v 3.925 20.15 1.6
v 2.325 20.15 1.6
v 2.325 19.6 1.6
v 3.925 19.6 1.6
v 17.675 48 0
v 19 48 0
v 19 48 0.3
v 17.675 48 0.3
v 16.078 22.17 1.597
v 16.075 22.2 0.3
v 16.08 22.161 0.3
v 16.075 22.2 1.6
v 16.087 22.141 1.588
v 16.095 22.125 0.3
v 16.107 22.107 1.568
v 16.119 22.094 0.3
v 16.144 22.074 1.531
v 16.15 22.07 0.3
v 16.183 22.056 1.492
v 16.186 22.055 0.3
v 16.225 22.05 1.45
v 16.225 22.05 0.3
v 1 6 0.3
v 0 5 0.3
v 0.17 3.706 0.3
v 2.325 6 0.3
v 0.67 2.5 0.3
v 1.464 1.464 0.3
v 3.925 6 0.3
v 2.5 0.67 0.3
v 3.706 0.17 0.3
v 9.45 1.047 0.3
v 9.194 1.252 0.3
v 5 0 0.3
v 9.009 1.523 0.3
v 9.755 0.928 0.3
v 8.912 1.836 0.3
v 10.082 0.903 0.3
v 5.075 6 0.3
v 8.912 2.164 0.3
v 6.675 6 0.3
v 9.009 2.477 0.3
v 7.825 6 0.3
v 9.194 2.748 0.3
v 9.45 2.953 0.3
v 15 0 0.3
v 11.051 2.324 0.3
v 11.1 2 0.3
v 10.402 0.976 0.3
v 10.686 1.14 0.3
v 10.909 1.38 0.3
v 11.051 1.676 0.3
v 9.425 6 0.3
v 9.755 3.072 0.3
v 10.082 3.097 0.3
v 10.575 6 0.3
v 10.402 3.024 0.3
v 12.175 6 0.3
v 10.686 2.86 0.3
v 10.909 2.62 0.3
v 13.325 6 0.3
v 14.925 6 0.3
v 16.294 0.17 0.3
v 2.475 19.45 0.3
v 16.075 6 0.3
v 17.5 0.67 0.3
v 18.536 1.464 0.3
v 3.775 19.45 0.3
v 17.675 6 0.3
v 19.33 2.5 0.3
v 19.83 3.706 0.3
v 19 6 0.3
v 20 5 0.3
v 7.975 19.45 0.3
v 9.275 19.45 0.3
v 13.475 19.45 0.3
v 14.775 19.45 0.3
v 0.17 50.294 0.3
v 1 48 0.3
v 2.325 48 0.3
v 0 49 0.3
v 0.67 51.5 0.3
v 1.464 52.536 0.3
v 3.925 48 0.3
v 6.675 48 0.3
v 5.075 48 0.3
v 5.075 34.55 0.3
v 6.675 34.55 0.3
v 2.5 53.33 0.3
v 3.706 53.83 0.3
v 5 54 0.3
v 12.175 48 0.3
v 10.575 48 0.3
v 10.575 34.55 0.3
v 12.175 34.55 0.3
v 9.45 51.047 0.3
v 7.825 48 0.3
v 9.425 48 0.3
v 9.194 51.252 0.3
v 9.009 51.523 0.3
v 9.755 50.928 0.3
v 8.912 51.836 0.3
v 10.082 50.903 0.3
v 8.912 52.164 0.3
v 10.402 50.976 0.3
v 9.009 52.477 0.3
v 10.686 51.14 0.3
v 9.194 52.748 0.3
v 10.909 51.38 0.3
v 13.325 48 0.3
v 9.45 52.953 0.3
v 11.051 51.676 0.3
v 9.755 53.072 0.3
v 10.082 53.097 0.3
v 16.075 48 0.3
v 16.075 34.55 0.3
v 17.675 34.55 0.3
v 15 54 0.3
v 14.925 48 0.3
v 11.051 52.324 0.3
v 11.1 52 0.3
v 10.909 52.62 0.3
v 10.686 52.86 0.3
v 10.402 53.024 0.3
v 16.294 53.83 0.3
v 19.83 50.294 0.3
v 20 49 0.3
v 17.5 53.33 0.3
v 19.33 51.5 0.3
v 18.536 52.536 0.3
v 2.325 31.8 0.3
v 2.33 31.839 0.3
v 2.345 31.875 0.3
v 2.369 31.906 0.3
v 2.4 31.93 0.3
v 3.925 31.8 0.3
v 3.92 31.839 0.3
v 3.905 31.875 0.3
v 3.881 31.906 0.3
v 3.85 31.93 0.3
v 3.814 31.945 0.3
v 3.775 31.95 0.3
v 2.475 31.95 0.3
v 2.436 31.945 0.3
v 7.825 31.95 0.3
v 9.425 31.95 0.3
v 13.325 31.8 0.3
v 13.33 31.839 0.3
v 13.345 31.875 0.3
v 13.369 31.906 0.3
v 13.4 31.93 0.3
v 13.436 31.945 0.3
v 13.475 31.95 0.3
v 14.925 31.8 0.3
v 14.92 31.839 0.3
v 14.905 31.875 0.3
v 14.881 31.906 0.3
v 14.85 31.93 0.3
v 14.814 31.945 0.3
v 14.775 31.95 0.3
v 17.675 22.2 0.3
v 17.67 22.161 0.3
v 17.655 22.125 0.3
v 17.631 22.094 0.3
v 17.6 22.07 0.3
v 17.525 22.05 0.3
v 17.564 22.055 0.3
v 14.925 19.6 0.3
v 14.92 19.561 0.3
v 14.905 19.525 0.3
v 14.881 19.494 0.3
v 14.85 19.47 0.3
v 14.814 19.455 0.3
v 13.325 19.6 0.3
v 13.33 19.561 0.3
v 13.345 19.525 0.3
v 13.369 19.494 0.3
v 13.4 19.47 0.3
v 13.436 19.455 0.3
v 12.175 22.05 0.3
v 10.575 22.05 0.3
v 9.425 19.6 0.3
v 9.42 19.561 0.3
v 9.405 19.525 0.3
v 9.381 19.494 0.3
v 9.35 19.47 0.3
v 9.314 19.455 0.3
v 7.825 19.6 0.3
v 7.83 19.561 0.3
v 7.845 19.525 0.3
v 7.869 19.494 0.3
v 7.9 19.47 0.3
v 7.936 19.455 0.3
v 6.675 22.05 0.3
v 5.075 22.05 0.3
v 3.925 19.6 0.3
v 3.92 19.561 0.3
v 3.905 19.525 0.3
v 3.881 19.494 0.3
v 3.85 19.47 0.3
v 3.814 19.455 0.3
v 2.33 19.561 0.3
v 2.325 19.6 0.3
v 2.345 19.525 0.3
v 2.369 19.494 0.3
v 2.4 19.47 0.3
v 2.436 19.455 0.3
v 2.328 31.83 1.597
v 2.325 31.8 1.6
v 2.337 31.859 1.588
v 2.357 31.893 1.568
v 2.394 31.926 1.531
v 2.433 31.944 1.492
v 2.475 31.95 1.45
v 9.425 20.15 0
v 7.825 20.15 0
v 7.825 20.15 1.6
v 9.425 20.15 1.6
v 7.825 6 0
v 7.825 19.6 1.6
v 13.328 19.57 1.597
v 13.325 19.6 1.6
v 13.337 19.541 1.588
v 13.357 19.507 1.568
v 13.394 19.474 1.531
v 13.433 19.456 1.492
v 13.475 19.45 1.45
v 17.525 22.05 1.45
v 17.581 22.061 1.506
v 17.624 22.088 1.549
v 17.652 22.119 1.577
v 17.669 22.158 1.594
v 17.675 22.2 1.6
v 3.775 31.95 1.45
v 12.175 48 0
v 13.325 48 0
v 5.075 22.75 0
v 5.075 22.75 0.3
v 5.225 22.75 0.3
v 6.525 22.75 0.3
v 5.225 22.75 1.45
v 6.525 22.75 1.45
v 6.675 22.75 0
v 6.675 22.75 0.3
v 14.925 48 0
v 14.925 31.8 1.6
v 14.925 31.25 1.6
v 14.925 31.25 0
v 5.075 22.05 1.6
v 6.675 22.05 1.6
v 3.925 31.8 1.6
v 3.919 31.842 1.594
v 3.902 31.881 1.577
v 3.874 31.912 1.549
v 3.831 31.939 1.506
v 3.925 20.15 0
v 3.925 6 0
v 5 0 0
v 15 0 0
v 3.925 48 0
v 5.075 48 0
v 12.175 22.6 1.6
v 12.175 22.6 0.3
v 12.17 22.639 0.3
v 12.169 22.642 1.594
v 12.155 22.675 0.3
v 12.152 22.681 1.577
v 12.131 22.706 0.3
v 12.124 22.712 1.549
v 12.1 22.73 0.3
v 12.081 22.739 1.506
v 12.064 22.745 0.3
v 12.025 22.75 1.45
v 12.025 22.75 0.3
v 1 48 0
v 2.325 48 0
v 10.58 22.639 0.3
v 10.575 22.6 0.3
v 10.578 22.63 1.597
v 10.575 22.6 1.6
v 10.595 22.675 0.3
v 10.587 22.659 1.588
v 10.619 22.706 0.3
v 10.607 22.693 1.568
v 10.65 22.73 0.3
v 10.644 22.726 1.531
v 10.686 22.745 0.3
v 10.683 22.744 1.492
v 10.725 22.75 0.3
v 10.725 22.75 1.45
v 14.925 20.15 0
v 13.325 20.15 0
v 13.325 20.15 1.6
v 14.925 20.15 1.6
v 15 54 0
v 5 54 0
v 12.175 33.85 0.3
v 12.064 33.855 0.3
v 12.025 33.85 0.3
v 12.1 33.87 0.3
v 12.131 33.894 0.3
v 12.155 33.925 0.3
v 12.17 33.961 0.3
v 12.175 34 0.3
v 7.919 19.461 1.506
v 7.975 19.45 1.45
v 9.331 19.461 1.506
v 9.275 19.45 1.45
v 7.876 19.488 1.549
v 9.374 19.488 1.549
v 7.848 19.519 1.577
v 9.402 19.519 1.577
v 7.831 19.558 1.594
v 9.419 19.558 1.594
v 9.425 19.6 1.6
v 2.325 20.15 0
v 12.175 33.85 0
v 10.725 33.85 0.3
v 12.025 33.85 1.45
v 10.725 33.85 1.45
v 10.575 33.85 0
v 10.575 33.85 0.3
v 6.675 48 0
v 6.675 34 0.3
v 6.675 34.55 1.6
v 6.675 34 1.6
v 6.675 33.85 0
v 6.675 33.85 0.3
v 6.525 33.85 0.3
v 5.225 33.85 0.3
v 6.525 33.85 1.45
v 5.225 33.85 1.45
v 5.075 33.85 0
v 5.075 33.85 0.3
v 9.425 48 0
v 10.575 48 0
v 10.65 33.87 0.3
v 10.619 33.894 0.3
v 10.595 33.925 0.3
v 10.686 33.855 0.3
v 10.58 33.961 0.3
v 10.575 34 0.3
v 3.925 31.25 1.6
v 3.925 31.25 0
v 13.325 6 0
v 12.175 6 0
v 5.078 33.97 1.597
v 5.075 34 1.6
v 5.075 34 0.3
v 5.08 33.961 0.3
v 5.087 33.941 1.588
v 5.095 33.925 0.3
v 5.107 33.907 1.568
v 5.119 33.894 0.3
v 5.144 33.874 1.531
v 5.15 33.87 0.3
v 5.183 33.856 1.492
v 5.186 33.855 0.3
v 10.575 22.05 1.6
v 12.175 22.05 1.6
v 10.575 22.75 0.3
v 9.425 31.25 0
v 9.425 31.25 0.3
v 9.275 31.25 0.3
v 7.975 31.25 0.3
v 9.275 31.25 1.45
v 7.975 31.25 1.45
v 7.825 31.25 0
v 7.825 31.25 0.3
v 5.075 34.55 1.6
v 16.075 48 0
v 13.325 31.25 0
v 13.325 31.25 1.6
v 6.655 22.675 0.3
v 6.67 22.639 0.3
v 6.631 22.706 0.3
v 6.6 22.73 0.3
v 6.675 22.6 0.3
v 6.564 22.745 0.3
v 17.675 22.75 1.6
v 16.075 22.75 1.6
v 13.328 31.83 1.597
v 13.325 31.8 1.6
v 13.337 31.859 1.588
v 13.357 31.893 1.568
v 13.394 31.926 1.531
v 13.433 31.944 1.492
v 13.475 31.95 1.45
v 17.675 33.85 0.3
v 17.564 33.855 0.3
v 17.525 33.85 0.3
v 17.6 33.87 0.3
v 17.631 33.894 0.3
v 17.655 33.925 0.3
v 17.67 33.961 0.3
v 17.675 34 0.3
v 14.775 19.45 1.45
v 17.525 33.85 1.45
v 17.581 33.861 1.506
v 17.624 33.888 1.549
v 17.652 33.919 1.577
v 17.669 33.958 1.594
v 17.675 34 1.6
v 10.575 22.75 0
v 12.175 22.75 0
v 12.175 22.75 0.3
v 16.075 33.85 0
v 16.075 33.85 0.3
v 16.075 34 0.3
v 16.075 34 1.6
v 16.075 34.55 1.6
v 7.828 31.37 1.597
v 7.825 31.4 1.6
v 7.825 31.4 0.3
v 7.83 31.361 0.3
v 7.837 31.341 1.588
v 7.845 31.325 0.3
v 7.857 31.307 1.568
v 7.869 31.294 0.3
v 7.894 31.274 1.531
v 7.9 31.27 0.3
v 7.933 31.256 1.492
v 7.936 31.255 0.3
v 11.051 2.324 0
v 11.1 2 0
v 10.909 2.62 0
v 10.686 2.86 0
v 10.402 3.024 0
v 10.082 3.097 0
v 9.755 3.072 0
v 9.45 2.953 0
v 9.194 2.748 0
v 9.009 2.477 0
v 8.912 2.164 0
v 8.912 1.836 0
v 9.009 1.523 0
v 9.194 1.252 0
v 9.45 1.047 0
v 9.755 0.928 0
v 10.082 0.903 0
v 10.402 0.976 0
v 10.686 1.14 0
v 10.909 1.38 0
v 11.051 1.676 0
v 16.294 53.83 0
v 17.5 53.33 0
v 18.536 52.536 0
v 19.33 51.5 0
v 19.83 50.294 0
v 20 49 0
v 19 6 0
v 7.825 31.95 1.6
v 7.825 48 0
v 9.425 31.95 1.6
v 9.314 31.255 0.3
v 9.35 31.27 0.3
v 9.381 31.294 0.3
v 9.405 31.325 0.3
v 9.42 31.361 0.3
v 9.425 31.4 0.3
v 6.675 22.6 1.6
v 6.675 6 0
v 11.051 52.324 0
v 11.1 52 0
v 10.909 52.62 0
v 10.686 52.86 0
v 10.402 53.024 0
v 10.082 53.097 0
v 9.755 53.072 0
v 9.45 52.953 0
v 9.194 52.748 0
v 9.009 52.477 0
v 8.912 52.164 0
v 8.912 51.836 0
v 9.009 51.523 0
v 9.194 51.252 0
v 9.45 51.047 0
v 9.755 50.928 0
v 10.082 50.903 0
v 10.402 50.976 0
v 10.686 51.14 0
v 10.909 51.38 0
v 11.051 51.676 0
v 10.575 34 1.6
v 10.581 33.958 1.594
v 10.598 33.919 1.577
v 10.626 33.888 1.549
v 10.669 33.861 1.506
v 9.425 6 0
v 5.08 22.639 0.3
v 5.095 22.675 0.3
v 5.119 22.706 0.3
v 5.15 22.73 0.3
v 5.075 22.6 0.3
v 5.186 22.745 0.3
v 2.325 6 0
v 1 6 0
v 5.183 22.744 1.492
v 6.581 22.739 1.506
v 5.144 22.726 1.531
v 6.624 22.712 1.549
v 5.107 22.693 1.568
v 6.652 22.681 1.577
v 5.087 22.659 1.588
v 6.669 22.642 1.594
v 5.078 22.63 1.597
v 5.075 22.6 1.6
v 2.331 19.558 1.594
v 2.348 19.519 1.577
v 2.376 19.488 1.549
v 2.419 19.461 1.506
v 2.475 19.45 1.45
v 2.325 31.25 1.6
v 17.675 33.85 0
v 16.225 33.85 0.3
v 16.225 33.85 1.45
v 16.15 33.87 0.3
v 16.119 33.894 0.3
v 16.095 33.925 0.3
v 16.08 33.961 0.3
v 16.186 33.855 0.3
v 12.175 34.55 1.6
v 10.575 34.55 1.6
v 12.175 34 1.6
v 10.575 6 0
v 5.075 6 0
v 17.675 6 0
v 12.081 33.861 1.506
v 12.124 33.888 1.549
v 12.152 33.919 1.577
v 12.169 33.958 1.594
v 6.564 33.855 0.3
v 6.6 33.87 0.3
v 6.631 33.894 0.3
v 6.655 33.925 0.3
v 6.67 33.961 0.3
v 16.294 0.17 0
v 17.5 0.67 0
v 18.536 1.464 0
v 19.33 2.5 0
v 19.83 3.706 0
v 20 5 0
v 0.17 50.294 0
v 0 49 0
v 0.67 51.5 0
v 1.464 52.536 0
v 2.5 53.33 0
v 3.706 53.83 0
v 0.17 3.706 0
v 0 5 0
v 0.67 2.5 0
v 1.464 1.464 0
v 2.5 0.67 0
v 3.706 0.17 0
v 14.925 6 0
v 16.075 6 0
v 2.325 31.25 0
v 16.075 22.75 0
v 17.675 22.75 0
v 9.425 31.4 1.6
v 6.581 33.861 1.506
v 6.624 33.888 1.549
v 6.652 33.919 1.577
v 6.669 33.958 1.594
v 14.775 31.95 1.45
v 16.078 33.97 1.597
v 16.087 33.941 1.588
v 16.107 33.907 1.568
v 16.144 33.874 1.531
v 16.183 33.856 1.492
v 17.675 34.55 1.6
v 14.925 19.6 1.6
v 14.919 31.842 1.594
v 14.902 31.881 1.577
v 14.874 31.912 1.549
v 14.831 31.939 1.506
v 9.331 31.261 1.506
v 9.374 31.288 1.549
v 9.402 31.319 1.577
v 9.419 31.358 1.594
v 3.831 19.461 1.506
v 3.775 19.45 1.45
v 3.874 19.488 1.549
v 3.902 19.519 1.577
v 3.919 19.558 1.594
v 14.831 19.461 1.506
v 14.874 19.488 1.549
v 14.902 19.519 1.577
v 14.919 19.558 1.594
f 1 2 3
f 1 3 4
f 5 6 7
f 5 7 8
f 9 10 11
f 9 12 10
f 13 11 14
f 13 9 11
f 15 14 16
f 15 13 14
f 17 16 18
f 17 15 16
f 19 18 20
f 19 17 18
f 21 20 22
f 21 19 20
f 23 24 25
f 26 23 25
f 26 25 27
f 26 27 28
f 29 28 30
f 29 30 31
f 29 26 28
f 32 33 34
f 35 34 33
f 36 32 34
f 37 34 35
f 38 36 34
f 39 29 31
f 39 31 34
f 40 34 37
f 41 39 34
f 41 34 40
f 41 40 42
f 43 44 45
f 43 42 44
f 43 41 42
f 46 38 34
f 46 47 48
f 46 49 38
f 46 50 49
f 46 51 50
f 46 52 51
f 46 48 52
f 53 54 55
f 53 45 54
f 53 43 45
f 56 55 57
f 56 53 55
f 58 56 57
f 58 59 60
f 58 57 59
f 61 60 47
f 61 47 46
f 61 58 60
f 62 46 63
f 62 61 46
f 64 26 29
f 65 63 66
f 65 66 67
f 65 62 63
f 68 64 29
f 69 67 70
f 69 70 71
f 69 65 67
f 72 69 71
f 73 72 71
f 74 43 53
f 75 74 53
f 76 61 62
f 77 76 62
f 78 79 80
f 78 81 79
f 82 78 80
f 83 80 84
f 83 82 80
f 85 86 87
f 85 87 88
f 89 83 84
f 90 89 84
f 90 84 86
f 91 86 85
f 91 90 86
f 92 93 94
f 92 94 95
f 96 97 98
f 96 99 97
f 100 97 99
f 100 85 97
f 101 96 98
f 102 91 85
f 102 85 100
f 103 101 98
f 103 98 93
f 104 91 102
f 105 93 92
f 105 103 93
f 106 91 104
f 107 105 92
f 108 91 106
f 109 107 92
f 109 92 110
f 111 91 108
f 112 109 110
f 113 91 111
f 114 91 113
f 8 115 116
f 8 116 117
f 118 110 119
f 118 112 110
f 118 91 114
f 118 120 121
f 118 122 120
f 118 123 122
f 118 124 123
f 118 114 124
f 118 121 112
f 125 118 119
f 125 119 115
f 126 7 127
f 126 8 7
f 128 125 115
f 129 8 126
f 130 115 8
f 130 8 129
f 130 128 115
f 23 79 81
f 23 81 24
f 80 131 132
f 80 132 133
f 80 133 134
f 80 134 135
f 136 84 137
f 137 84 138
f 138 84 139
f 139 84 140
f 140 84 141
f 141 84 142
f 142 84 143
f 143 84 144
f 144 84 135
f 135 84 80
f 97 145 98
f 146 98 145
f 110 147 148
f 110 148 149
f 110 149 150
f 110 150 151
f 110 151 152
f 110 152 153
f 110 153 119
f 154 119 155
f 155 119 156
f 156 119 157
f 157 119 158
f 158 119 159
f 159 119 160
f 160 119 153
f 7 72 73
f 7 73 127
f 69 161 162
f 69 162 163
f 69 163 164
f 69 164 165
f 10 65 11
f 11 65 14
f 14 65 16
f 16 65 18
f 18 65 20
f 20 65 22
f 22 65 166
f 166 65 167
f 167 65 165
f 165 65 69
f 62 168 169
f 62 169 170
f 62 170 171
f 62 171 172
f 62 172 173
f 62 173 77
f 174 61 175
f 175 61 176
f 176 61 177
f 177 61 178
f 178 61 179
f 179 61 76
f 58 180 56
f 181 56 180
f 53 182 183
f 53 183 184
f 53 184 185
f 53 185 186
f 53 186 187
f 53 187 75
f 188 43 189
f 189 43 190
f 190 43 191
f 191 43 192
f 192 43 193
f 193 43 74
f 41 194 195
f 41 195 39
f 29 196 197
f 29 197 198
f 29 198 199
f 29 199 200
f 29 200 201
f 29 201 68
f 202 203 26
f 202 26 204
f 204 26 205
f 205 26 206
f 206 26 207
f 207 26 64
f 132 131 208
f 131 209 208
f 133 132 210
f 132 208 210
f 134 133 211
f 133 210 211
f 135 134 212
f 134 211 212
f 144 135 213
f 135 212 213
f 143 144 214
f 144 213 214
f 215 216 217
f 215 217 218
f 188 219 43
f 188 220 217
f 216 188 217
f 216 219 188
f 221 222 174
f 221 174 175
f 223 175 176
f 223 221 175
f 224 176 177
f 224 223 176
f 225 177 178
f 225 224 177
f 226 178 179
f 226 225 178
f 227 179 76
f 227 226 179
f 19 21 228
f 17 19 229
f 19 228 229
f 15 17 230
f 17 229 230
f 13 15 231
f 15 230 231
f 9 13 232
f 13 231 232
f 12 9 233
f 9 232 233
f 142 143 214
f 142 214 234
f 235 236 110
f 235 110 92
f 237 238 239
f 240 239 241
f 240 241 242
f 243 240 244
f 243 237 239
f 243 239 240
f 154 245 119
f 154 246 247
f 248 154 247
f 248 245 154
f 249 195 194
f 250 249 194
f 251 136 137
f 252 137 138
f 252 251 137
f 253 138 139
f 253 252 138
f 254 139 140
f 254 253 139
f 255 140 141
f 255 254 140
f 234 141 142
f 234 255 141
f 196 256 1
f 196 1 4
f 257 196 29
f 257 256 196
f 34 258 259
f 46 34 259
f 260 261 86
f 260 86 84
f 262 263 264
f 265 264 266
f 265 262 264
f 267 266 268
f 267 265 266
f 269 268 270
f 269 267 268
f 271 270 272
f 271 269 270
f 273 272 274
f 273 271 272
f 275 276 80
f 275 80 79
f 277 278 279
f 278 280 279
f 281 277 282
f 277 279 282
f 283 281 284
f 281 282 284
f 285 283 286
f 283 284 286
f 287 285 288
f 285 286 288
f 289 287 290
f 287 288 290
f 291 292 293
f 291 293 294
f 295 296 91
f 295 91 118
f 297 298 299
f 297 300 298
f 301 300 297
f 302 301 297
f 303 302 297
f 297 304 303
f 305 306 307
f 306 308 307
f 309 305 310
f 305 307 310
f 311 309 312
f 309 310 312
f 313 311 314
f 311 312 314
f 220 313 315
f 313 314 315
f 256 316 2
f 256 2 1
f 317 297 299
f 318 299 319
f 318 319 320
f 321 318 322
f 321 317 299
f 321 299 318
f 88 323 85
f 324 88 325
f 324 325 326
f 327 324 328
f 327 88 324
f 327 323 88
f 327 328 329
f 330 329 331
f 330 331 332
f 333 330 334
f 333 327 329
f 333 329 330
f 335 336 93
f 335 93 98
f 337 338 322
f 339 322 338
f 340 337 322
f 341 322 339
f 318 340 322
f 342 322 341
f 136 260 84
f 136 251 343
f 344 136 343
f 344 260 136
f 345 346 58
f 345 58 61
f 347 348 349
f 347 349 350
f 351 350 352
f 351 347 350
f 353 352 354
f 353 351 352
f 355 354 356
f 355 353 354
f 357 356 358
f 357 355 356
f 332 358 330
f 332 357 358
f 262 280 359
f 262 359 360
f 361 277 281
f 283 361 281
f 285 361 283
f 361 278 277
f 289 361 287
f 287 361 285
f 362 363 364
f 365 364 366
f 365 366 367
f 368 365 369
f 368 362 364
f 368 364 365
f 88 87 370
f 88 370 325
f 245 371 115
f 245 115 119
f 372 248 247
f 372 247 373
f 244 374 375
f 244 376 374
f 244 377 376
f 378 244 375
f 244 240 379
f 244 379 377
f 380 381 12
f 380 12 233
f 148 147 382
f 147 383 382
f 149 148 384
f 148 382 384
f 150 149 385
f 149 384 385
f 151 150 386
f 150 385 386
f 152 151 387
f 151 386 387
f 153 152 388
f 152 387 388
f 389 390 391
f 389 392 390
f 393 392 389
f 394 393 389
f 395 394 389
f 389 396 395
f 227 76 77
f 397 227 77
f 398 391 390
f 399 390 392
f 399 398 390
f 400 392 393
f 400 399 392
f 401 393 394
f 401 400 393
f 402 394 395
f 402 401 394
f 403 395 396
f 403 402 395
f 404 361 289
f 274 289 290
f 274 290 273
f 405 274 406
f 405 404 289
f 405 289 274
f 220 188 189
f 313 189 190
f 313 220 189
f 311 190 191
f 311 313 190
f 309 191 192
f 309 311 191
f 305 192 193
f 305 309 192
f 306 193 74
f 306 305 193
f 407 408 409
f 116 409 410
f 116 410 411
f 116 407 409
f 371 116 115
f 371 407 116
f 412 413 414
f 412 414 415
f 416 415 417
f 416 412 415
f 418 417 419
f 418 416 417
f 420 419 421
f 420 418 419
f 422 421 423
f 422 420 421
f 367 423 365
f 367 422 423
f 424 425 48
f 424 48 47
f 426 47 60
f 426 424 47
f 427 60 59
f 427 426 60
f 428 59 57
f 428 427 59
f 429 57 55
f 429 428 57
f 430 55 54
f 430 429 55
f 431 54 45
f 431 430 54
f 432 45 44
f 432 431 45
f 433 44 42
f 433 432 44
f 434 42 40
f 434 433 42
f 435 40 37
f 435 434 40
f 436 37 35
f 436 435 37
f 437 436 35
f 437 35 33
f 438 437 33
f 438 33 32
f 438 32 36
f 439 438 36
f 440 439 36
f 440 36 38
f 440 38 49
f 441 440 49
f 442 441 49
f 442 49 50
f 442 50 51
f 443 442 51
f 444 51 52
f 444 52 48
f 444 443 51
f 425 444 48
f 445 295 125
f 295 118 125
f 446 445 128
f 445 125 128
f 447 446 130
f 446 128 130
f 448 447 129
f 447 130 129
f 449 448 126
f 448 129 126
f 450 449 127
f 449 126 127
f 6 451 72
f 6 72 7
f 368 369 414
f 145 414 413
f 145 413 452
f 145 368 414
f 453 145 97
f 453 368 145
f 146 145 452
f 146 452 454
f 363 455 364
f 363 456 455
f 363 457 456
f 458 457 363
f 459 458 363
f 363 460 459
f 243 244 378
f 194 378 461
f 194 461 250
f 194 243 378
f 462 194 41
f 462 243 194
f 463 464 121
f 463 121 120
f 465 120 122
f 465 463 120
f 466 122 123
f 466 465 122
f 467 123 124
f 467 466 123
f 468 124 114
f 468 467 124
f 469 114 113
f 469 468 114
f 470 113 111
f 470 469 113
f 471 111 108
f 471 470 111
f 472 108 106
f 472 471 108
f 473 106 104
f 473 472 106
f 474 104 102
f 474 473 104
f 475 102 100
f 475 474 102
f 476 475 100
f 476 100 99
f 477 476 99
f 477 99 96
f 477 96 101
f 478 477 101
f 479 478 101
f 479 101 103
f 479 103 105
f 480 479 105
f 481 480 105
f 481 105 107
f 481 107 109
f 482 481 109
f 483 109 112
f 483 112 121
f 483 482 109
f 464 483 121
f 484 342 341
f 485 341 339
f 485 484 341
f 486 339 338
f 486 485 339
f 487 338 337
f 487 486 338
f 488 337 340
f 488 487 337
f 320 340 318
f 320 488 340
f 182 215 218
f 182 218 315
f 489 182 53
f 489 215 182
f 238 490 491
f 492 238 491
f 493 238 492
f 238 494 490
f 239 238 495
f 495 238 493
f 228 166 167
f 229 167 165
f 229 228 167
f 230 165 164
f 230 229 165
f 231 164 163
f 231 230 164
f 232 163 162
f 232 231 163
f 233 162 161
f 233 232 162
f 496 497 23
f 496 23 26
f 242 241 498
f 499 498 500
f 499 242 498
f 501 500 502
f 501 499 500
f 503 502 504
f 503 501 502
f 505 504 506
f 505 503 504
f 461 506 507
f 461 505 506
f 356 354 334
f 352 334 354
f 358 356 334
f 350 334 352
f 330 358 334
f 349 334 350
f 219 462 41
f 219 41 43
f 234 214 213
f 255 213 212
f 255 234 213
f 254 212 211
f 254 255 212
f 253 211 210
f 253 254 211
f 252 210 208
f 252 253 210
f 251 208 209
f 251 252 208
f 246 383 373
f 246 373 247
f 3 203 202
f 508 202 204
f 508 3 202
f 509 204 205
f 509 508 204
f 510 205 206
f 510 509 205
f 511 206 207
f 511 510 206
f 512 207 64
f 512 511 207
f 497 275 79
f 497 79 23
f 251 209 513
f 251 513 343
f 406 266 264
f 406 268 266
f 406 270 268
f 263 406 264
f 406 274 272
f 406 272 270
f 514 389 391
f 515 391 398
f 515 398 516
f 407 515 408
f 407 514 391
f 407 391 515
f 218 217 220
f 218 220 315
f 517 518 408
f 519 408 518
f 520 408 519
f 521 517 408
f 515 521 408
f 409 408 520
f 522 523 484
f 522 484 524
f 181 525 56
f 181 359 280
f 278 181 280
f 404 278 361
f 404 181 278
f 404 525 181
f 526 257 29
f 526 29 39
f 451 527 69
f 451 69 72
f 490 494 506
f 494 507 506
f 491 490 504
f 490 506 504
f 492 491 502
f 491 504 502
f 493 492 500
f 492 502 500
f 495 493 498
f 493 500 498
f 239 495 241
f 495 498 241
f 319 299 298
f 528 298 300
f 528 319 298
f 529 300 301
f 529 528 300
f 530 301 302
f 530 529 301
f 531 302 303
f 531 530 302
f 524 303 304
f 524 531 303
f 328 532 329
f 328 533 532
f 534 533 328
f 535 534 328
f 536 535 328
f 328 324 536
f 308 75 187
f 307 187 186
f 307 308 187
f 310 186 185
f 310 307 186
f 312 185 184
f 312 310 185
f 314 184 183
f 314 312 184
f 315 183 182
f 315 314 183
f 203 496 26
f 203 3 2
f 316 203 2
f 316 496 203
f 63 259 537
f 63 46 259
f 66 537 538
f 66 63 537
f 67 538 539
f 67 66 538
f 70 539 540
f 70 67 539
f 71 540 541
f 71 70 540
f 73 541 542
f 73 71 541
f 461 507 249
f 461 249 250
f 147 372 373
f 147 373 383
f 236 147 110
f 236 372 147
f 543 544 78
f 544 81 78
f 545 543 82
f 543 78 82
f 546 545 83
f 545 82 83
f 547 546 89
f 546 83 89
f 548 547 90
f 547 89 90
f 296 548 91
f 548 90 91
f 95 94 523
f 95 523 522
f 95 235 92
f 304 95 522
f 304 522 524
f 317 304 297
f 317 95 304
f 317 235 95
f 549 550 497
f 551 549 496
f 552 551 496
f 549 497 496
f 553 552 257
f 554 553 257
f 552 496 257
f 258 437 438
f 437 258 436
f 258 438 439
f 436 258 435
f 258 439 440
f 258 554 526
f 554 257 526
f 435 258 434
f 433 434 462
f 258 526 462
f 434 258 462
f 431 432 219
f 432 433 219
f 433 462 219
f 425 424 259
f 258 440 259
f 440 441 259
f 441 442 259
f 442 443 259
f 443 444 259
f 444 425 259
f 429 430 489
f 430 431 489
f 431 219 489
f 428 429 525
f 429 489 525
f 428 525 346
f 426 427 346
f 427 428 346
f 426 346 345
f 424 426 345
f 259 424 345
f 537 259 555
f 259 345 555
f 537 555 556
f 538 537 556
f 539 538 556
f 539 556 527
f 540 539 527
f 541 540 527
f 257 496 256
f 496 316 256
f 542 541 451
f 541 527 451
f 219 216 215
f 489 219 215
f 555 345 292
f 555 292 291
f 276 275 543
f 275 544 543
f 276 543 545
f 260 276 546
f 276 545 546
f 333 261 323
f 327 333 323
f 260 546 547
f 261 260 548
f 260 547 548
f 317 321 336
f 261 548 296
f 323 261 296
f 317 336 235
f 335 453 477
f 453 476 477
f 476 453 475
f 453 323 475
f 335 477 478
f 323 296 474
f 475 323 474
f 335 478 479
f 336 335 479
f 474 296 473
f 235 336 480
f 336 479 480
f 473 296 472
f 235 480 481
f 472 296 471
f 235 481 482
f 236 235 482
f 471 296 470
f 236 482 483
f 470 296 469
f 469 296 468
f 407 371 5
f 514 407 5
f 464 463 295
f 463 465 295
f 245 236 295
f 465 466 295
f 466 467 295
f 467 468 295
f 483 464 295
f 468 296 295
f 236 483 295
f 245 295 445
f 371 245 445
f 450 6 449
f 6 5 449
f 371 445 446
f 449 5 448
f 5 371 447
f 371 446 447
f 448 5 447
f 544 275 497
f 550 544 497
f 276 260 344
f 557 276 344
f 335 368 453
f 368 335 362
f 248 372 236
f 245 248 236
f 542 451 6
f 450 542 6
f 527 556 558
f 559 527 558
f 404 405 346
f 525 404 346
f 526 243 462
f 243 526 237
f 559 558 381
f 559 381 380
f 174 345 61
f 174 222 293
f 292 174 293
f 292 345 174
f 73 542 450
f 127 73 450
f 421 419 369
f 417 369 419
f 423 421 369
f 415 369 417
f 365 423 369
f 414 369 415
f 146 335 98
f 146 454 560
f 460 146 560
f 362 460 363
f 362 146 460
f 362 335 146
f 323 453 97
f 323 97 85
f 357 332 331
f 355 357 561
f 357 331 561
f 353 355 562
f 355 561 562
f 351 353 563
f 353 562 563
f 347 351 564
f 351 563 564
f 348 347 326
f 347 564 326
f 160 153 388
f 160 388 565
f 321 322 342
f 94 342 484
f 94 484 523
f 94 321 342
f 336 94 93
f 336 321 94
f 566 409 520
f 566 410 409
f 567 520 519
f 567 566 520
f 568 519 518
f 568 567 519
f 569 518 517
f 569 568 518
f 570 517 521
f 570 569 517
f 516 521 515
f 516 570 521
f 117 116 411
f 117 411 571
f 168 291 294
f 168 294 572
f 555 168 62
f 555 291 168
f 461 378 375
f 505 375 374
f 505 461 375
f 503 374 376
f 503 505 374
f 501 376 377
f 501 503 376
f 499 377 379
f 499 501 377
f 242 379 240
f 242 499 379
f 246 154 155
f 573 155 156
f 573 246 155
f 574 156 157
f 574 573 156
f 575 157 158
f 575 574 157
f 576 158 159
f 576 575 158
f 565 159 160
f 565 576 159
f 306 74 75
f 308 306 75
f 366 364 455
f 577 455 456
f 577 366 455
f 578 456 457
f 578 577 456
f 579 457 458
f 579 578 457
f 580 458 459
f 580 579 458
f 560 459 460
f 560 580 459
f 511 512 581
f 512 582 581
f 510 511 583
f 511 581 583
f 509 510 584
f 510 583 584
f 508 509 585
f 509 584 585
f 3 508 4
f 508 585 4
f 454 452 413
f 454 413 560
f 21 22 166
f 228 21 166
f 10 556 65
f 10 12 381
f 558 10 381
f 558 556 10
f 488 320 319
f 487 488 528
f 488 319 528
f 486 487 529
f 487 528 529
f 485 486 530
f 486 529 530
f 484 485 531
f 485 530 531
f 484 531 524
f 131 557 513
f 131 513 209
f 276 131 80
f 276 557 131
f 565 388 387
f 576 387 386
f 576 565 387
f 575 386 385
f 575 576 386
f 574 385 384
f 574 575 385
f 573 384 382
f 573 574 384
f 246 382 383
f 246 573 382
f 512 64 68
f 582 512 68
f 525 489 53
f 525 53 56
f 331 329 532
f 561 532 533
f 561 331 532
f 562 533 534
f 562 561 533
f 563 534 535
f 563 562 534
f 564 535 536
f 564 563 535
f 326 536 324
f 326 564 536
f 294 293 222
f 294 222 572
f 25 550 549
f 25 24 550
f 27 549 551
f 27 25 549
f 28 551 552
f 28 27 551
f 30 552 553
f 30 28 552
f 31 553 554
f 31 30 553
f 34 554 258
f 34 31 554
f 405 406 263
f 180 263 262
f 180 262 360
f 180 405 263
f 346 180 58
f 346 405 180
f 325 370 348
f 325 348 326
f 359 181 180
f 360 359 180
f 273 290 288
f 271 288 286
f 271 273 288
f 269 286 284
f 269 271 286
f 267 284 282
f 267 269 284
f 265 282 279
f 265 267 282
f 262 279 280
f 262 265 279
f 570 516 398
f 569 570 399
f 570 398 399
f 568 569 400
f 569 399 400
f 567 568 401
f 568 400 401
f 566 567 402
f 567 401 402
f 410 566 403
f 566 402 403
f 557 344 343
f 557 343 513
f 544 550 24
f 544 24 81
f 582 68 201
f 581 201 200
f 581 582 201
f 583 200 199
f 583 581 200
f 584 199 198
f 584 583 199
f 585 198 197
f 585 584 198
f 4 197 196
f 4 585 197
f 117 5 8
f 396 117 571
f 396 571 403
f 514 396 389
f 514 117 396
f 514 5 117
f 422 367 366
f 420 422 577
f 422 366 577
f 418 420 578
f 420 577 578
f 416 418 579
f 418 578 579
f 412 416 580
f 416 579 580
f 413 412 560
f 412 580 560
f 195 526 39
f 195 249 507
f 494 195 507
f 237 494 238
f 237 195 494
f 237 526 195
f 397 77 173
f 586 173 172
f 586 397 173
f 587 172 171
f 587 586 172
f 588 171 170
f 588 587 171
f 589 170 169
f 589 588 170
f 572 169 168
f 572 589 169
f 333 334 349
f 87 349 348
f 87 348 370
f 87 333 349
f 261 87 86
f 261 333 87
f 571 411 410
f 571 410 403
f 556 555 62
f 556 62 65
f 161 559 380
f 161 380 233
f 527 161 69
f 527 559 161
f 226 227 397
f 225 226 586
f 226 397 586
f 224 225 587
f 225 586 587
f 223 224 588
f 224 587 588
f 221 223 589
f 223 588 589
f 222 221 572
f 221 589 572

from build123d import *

# Parameters (mm, degrees)
SKETCH009_W  = 20
SKETCH009_H  = 54
SKETCH009_R  = 1.1
PAD009_DEPTH = 0.3
FILLET_R     = 5
SKETCH001_W  = 1.6
SKETCH001_H  = 0.7
PAD001_DEPTH = 1.3
FILLET001_R  = 0.15
FILLET002_R  = 0.15


with BuildPart() as fillet_body:
    # Sketch009 → Pad009 (new body)
    with BuildSketch(Plane.XY):
        with Locations((10, 27)):
            Rectangle(SKETCH009_W, SKETCH009_H)
        with Locations((10, 52)):
            Circle(SKETCH009_R, mode=Mode.SUBTRACT)
        with Locations((10, 2)):
            Circle(SKETCH009_R, mode=Mode.SUBTRACT)
        Polygon((1, 48), (1, 6), (2.325, 6), (2.325, 20.15), (3.925, 20.15), (3.925, 6), (5.075, 6), (5.075, 22.75), (6.675, 22.75), (6.675, 6), (7.825, 6), (7.825, 20.15), (9.425, 20.15), (9.425, 6), (10.575, 6), (10.575, 22.75), (12.175, 22.75), (12.175, 6), (13.325, 6), (13.325, 20.15), (14.925, 20.15), (14.925, 6), (16.075, 6), (16.075, 22.75), (17.675, 22.75), (17.675, 6), (19, 6), (19, 48), (17.675, 48), (17.675, 33.85), (16.075, 33.85), (16.075, 48), (14.925, 48), (14.925, 31.25), (13.325, 31.25), (13.325, 48), (12.175, 48), (12.175, 33.85), (10.575, 33.85), (10.575, 48), (9.425, 48), (9.425, 31.25), (7.825, 31.25), (7.825, 48), (6.675, 48), (6.675, 33.85), (5.075, 33.85), (5.075, 48), (3.925, 48), (3.925, 31.25), (2.325, 31.25), (2.325, 48), align=None, mode=Mode.SUBTRACT)
    extrude(amount=PAD009_DEPTH)

    # Fillet
    fillet_edges = [fillet_body.edges().sort_by_distance(p)[0] for p in [
        (20, 0, 0.15),
        (0, 0, 0.15),
        (20, 54, 0.15),
        (0, 54, 0.15),
    ]]
    fillet(fillet_edges, radius=FILLET_R)


with BuildPart() as fusion:
    # Sketch001 → Pad001 (new body)
    with BuildSketch(Plane.XY.offset(0.3)):
        with Locations((3.125, 19.8)):
            Rectangle(SKETCH001_W, SKETCH001_H)
        with Locations((5.875, 22.4)):
            Rectangle(SKETCH001_W, SKETCH001_H)
        with Locations((8.625, 19.8)):
            Rectangle(SKETCH001_W, SKETCH001_H)
        with Locations((11.375, 22.4)):
            Rectangle(SKETCH001_W, SKETCH001_H)
        with Locations((14.125, 19.8)):
            Rectangle(SKETCH001_W, SKETCH001_H)
        with Locations((16.875, 22.4)):
            Rectangle(SKETCH001_W, SKETCH001_H)
        with Locations((3.125, 31.6)):
            Rectangle(SKETCH001_W, SKETCH001_H)
        with Locations((5.875, 34.2)):
            Rectangle(SKETCH001_W, SKETCH001_H)
        with Locations((8.625, 31.6)):
            Rectangle(SKETCH001_W, SKETCH001_H)
        with Locations((11.375, 34.2)):
            Rectangle(SKETCH001_W, SKETCH001_H)
        with Locations((14.125, 31.6)):
            Rectangle(SKETCH001_W, SKETCH001_H)
        with Locations((16.875, 34.2)):
            Rectangle(SKETCH001_W, SKETCH001_H)
    extrude(amount=PAD001_DEPTH)

    # Fillet001
    fillet001_edges = [fusion.edges().sort_by_distance(p)[0] for p in [
        (9.425, 19.45, 0.95),
        (8.625, 19.45, 1.6),
        (7.825, 19.45, 0.95),
        (7.825, 31.25, 0.95),
        (8.625, 31.25, 1.6),
        (9.425, 31.25, 0.95),
        (10.575, 22.75, 0.95),
        (11.375, 22.75, 1.6),
        (12.175, 22.75, 0.95),
        (16.075, 22.05, 0.95),
        (16.875, 22.05, 1.6),
        (17.675, 22.05, 0.95),
        (13.325, 31.95, 0.95),
        (14.125, 31.95, 1.6),
        (14.925, 31.95, 0.95),
        (5.075, 33.85, 0.95),
        (5.875, 33.85, 1.6),
        (6.675, 33.85, 0.95),
    ]]
    fillet(fillet001_edges, radius=FILLET001_R)

    # Fillet002
    fillet002_edges = [fusion.edges().sort_by_distance(p)[0] for p in [
        (3.925, 19.45, 0.95),
        (3.125, 19.45, 1.6),
        (2.325, 19.45, 0.95),
        (13.325, 19.45, 0.95),
        (14.125, 19.45, 1.6),
        (14.925, 19.45, 0.95),
        (2.325, 31.95, 0.95),
        (3.125, 31.95, 1.6),
        (3.925, 31.95, 0.95),
        (5.075, 22.75, 0.95),
        (5.875, 22.75, 1.6),
        (6.675, 22.75, 0.95),
        (16.075, 33.85, 0.95),
        (16.875, 33.85, 1.6),
        (17.675, 33.85, 0.95),
        (12.175, 33.85, 0.95),
        (11.375, 33.85, 1.6),
        (10.575, 33.85, 0.95),
    ]]
    fillet(fillet002_edges, radius=FILLET002_R)

    # Fusion: union Fillet body
    add(fillet_body.part)


solid = fusion.part
